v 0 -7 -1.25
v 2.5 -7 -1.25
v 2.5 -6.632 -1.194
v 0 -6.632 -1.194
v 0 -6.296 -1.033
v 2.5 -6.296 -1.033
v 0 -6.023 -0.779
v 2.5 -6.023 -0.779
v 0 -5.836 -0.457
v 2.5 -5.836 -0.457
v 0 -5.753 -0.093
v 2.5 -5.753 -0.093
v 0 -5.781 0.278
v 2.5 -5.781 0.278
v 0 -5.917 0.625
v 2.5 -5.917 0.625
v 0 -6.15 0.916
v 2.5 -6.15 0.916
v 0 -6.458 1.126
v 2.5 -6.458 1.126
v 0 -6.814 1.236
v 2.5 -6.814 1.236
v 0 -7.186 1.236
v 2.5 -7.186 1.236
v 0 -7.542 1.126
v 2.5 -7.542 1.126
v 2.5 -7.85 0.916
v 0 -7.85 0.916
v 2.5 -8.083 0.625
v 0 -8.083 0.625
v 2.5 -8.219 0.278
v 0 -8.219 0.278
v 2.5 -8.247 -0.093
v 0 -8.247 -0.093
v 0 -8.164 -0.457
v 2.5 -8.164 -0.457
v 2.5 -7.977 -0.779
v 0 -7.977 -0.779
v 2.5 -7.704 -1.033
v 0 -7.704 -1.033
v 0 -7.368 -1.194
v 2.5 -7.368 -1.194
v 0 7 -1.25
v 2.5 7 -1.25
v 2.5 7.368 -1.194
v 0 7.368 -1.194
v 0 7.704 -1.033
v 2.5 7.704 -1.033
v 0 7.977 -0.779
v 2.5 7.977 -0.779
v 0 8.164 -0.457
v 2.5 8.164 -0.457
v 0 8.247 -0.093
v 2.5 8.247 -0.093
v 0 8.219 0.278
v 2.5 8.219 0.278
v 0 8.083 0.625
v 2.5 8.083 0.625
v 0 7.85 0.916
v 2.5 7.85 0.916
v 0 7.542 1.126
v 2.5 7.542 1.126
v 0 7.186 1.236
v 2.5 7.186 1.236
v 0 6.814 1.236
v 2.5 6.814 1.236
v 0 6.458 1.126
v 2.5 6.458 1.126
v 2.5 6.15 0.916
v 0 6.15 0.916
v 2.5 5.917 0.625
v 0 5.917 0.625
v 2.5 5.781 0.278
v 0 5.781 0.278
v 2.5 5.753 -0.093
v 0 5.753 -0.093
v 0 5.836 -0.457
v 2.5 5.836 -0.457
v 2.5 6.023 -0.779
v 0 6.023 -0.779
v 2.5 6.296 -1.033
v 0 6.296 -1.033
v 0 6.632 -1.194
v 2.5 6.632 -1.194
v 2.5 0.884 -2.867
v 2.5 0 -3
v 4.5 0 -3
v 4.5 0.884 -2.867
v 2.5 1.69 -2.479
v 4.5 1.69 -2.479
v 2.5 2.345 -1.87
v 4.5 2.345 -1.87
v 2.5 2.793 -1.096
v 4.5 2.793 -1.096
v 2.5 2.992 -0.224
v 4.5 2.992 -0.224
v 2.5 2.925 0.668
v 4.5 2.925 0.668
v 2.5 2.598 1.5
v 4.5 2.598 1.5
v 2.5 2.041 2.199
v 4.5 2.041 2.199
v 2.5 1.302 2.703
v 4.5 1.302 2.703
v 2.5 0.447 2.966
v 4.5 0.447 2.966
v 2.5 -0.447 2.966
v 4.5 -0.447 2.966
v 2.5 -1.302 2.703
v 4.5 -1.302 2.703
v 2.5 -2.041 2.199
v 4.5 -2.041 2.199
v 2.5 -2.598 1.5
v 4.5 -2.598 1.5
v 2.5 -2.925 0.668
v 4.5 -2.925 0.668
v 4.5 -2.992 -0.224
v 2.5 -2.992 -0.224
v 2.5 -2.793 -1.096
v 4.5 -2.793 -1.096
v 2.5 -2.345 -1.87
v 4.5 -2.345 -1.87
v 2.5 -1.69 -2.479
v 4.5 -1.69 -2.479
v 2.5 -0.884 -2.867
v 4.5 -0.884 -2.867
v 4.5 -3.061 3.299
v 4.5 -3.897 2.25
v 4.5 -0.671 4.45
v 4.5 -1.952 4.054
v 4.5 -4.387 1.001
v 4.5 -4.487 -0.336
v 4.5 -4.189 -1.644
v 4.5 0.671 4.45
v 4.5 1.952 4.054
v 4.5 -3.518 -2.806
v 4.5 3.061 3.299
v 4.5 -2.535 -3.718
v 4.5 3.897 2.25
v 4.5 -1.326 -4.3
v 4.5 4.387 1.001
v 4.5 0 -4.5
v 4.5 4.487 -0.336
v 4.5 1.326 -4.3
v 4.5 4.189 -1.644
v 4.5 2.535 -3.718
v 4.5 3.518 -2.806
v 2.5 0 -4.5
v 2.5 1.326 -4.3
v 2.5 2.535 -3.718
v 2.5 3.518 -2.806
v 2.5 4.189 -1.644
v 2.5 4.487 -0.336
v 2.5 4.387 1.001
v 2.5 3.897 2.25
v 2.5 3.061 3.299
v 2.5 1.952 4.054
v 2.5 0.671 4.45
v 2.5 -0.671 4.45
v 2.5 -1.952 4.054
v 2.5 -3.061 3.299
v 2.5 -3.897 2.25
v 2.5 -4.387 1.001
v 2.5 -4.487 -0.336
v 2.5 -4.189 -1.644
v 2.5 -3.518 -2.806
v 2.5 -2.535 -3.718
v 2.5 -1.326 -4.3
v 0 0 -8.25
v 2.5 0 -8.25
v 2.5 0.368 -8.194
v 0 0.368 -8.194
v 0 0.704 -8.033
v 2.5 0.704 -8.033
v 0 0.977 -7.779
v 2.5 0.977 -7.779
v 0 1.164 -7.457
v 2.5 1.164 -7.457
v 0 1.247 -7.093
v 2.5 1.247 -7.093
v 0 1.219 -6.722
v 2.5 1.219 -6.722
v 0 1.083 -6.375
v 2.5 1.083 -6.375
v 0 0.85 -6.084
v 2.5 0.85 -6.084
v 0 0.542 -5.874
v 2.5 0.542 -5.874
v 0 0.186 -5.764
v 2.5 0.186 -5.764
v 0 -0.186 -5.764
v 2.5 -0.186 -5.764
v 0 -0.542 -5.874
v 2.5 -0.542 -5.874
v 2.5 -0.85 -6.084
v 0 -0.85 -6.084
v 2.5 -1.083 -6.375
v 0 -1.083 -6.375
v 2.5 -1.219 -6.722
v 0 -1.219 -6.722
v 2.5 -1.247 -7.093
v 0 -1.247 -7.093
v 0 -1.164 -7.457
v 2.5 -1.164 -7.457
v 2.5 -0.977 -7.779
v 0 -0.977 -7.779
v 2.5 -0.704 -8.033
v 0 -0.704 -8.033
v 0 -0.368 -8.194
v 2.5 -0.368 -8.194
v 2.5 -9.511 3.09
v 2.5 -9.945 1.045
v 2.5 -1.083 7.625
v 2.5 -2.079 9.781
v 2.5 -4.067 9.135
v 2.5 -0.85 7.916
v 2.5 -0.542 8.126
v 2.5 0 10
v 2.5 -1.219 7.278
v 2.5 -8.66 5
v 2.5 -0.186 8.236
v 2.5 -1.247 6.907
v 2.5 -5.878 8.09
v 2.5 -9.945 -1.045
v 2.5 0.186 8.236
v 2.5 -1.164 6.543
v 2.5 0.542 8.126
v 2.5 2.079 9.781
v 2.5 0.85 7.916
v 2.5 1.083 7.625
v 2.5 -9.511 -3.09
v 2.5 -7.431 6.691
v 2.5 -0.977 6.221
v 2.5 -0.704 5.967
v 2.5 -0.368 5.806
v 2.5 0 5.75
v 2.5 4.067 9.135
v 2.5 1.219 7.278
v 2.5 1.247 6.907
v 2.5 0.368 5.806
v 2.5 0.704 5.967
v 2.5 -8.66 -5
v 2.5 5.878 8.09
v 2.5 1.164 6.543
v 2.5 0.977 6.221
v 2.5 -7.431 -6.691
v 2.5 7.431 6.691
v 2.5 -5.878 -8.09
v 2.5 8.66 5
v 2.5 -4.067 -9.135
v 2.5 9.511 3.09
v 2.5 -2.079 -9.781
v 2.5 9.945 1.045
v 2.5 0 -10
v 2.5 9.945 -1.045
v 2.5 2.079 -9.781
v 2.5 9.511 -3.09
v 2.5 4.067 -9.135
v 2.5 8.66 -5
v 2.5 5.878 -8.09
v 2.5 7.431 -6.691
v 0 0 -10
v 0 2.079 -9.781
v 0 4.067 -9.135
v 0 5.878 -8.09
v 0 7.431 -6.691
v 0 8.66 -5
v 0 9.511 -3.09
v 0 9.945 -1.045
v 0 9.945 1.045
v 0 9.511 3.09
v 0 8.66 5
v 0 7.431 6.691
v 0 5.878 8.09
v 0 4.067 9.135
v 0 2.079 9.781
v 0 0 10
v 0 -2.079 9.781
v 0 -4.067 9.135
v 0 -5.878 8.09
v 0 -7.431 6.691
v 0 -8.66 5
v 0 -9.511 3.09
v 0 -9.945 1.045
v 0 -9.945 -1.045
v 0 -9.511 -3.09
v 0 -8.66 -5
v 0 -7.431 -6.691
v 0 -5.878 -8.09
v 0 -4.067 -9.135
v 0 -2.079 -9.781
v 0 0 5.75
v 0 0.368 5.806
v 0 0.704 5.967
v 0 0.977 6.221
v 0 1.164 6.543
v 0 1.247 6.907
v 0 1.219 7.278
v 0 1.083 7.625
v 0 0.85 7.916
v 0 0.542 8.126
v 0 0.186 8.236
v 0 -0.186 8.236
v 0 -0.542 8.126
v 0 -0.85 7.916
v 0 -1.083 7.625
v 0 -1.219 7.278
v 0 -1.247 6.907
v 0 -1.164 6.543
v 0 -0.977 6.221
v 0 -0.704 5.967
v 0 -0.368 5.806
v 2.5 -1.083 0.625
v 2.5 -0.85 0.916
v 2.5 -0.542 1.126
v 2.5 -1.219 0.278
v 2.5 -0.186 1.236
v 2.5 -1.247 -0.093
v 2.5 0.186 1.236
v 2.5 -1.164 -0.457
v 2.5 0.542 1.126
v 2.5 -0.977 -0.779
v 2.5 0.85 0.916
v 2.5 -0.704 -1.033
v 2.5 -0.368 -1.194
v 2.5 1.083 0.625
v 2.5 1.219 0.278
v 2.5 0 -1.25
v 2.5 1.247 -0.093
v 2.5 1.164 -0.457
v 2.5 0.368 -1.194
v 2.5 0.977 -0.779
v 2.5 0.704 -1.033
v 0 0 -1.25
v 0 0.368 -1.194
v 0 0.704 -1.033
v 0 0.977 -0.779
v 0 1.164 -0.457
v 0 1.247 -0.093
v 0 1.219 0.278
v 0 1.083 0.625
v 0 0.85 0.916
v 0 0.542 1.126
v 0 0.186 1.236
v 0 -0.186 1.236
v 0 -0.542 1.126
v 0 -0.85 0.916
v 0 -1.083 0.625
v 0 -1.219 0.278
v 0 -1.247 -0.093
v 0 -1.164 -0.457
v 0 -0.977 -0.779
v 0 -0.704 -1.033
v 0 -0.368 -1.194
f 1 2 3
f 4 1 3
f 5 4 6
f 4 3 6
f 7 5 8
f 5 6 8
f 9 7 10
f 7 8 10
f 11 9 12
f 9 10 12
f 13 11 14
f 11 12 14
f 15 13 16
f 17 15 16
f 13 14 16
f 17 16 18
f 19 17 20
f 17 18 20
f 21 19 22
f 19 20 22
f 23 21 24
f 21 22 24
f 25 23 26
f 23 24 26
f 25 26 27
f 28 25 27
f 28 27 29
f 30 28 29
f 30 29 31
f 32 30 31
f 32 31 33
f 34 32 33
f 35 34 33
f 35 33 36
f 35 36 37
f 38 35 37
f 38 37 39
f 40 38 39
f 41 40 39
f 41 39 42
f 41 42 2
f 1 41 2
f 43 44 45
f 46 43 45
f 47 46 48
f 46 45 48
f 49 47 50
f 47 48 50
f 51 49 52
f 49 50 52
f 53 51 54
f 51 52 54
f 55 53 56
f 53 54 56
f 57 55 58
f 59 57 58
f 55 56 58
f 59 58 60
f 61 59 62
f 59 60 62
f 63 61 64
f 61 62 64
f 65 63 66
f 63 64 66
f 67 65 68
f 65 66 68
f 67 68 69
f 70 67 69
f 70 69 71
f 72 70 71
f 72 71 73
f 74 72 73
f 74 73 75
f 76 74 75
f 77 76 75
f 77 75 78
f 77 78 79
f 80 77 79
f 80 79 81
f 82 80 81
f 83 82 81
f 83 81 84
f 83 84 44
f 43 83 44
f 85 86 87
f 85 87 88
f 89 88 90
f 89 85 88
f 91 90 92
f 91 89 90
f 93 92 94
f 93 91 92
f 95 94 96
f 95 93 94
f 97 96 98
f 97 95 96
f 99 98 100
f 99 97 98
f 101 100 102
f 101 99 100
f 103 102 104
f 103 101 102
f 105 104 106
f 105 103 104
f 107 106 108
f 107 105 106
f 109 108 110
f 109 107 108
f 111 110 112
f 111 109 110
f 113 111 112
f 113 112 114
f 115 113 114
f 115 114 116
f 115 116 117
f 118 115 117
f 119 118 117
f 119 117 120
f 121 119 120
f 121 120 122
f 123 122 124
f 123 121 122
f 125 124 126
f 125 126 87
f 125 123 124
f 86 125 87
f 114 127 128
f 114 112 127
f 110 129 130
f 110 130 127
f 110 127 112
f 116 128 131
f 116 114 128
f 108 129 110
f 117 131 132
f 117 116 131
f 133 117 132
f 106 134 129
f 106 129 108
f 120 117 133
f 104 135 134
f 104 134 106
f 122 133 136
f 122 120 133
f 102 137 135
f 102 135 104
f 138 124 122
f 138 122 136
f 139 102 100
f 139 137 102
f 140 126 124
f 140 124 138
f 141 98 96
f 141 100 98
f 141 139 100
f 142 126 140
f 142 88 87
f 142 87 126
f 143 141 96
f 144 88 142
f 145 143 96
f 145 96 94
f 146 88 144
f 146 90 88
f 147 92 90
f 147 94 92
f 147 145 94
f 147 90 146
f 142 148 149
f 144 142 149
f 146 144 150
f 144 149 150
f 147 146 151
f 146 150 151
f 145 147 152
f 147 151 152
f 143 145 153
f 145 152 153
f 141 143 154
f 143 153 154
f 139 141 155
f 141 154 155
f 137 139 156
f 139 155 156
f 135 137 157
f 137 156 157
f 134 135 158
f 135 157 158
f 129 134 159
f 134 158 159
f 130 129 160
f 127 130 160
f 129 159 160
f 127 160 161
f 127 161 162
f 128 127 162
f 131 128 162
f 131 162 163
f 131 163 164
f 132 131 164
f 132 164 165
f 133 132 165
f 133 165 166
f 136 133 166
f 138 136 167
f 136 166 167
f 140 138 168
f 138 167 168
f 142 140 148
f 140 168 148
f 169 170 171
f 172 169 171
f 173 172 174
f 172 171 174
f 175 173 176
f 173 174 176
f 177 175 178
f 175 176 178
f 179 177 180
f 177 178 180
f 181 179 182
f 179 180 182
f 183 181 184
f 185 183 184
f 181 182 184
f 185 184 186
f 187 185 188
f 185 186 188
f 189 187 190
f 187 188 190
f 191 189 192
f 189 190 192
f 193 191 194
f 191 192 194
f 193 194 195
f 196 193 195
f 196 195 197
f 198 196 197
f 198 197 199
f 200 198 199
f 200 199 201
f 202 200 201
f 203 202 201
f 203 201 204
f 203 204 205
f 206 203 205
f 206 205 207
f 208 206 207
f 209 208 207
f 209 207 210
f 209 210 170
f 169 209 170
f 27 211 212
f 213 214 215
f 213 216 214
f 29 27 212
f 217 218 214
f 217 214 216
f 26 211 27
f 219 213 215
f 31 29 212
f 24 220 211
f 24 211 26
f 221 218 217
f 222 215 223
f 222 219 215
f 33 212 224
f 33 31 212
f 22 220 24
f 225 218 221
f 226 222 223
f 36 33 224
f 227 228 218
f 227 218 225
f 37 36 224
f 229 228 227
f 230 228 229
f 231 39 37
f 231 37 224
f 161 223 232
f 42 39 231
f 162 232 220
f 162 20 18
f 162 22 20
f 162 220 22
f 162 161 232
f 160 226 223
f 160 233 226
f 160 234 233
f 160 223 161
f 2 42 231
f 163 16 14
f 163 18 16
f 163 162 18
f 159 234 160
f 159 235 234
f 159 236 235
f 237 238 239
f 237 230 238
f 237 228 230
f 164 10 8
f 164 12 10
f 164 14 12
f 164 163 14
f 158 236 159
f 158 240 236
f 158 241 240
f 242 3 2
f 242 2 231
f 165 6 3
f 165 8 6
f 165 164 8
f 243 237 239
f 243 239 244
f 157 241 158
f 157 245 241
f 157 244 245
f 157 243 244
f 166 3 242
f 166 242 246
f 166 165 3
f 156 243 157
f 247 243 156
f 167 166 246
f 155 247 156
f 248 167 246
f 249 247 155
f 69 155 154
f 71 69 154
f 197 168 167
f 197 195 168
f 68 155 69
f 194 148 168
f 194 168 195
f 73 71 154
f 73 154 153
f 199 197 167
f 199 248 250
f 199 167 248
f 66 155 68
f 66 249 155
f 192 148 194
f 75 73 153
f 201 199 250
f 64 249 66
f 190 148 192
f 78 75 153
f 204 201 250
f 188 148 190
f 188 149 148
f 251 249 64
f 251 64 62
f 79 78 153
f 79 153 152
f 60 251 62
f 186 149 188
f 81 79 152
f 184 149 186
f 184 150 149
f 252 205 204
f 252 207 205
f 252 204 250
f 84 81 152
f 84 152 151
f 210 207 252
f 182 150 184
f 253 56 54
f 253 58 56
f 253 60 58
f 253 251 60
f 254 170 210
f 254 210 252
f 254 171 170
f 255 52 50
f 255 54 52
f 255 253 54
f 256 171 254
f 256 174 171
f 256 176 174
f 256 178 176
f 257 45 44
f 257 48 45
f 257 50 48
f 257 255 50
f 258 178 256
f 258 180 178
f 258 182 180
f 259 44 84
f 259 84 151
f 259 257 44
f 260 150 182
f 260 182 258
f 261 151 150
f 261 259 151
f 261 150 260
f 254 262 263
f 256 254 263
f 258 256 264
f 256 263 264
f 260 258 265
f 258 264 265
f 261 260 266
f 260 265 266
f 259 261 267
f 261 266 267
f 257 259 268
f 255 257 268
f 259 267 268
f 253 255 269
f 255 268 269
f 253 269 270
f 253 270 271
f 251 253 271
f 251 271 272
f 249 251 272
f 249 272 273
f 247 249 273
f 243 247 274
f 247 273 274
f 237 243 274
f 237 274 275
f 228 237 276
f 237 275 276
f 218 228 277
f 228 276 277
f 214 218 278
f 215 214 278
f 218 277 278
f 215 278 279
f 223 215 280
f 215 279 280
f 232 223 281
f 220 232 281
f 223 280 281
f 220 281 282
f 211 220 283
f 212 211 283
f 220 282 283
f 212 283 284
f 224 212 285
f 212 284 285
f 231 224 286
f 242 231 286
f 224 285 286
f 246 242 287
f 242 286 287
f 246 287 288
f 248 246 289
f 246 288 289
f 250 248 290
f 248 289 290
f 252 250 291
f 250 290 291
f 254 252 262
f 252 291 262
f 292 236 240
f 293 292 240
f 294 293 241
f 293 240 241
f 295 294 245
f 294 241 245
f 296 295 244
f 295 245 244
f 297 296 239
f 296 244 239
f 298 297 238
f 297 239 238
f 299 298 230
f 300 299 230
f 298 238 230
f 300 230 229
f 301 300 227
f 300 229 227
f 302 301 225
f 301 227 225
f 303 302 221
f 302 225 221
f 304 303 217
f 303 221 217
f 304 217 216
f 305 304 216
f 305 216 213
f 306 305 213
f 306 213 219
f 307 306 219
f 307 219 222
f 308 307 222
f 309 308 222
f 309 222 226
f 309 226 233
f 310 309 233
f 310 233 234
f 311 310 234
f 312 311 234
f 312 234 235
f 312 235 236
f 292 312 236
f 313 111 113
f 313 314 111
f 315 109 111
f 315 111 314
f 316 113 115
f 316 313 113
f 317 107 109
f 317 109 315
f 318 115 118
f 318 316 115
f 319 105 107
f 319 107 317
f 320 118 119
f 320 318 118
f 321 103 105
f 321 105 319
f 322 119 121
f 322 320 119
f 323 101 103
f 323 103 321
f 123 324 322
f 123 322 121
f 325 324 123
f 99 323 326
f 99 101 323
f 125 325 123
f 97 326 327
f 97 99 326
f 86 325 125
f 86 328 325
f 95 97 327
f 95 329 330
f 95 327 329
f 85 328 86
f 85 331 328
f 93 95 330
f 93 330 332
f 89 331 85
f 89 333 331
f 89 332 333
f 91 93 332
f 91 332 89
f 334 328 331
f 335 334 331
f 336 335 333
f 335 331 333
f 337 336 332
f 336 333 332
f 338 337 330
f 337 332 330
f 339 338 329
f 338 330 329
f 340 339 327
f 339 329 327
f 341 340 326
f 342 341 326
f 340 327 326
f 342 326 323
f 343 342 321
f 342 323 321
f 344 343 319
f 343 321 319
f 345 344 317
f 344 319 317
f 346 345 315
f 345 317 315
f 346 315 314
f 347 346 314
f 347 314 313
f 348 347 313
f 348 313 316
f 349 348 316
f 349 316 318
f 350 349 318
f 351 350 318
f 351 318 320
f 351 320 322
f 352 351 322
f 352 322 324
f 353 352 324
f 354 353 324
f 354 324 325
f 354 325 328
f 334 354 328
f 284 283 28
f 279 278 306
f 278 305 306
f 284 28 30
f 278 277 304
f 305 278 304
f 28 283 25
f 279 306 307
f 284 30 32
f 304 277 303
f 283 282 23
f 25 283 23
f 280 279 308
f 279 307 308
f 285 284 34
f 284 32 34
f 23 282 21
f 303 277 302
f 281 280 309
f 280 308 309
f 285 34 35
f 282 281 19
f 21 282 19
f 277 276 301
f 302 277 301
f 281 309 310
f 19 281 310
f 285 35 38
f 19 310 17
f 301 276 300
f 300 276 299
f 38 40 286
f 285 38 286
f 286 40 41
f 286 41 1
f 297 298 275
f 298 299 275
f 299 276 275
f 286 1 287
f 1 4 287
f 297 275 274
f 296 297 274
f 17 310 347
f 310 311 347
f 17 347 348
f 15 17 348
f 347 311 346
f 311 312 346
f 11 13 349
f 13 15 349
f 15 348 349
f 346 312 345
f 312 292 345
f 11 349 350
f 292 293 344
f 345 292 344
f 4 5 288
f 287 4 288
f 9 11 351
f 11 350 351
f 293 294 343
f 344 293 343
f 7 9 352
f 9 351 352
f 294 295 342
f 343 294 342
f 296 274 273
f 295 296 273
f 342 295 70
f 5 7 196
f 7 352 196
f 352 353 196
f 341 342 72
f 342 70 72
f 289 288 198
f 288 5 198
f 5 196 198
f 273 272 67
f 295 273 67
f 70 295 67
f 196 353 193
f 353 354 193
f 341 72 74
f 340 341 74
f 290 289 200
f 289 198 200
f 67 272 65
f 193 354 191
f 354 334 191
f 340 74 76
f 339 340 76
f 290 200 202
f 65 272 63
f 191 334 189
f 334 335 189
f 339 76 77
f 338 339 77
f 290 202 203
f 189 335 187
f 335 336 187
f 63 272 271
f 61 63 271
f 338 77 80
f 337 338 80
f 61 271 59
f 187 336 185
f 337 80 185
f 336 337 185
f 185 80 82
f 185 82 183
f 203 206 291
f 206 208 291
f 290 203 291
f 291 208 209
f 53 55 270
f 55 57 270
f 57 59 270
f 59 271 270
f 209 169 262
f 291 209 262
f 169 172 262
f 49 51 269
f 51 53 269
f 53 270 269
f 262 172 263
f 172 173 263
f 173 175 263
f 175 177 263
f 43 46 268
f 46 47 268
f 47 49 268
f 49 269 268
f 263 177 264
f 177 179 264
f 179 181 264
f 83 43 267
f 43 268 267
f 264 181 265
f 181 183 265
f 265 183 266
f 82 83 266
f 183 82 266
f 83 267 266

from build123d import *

# Parameters (mm, degrees)
SKETCH_1_R         = 10
EXTRUDE_1_DEPTH    = 2.5
SKETCH_2_R         = 4.5
SKETCH_2_R_2       = 3
EXTRUDE_2_DEPTH    = 2
HOLE_WIZARD_M3_1_D = 2.5


with BuildPart() as part:
    # 草图1 → 凸台-拉伸1 (new body)
    with BuildSketch(Plane(origin=(0, 0, 0), x_dir=(0, 0, -1), z_dir=(1, 0, 0))):
        Circle(SKETCH_1_R)
    extrude(amount=EXTRUDE_1_DEPTH)

    # 草图2 → 凸台-拉伸2 (add)
    with BuildSketch(Plane(origin=(2.5, 0, 0), x_dir=(0, 0, -1), z_dir=(1, 0, 0))):
        Circle(SKETCH_2_R)
        Circle(SKETCH_2_R_2, mode=Mode.SUBTRACT)
    extrude(amount=EXTRUDE_2_DEPTH)

    # M3 螺纹孔1 (through all)
    with Locations(Plane.ZY):
        with Locations((0, 0), (0, 7), (-7, 0), (7, 0), (0, -7)):
            Hole(HOLE_WIZARD_M3_1_D / 2)


solid = part.part
